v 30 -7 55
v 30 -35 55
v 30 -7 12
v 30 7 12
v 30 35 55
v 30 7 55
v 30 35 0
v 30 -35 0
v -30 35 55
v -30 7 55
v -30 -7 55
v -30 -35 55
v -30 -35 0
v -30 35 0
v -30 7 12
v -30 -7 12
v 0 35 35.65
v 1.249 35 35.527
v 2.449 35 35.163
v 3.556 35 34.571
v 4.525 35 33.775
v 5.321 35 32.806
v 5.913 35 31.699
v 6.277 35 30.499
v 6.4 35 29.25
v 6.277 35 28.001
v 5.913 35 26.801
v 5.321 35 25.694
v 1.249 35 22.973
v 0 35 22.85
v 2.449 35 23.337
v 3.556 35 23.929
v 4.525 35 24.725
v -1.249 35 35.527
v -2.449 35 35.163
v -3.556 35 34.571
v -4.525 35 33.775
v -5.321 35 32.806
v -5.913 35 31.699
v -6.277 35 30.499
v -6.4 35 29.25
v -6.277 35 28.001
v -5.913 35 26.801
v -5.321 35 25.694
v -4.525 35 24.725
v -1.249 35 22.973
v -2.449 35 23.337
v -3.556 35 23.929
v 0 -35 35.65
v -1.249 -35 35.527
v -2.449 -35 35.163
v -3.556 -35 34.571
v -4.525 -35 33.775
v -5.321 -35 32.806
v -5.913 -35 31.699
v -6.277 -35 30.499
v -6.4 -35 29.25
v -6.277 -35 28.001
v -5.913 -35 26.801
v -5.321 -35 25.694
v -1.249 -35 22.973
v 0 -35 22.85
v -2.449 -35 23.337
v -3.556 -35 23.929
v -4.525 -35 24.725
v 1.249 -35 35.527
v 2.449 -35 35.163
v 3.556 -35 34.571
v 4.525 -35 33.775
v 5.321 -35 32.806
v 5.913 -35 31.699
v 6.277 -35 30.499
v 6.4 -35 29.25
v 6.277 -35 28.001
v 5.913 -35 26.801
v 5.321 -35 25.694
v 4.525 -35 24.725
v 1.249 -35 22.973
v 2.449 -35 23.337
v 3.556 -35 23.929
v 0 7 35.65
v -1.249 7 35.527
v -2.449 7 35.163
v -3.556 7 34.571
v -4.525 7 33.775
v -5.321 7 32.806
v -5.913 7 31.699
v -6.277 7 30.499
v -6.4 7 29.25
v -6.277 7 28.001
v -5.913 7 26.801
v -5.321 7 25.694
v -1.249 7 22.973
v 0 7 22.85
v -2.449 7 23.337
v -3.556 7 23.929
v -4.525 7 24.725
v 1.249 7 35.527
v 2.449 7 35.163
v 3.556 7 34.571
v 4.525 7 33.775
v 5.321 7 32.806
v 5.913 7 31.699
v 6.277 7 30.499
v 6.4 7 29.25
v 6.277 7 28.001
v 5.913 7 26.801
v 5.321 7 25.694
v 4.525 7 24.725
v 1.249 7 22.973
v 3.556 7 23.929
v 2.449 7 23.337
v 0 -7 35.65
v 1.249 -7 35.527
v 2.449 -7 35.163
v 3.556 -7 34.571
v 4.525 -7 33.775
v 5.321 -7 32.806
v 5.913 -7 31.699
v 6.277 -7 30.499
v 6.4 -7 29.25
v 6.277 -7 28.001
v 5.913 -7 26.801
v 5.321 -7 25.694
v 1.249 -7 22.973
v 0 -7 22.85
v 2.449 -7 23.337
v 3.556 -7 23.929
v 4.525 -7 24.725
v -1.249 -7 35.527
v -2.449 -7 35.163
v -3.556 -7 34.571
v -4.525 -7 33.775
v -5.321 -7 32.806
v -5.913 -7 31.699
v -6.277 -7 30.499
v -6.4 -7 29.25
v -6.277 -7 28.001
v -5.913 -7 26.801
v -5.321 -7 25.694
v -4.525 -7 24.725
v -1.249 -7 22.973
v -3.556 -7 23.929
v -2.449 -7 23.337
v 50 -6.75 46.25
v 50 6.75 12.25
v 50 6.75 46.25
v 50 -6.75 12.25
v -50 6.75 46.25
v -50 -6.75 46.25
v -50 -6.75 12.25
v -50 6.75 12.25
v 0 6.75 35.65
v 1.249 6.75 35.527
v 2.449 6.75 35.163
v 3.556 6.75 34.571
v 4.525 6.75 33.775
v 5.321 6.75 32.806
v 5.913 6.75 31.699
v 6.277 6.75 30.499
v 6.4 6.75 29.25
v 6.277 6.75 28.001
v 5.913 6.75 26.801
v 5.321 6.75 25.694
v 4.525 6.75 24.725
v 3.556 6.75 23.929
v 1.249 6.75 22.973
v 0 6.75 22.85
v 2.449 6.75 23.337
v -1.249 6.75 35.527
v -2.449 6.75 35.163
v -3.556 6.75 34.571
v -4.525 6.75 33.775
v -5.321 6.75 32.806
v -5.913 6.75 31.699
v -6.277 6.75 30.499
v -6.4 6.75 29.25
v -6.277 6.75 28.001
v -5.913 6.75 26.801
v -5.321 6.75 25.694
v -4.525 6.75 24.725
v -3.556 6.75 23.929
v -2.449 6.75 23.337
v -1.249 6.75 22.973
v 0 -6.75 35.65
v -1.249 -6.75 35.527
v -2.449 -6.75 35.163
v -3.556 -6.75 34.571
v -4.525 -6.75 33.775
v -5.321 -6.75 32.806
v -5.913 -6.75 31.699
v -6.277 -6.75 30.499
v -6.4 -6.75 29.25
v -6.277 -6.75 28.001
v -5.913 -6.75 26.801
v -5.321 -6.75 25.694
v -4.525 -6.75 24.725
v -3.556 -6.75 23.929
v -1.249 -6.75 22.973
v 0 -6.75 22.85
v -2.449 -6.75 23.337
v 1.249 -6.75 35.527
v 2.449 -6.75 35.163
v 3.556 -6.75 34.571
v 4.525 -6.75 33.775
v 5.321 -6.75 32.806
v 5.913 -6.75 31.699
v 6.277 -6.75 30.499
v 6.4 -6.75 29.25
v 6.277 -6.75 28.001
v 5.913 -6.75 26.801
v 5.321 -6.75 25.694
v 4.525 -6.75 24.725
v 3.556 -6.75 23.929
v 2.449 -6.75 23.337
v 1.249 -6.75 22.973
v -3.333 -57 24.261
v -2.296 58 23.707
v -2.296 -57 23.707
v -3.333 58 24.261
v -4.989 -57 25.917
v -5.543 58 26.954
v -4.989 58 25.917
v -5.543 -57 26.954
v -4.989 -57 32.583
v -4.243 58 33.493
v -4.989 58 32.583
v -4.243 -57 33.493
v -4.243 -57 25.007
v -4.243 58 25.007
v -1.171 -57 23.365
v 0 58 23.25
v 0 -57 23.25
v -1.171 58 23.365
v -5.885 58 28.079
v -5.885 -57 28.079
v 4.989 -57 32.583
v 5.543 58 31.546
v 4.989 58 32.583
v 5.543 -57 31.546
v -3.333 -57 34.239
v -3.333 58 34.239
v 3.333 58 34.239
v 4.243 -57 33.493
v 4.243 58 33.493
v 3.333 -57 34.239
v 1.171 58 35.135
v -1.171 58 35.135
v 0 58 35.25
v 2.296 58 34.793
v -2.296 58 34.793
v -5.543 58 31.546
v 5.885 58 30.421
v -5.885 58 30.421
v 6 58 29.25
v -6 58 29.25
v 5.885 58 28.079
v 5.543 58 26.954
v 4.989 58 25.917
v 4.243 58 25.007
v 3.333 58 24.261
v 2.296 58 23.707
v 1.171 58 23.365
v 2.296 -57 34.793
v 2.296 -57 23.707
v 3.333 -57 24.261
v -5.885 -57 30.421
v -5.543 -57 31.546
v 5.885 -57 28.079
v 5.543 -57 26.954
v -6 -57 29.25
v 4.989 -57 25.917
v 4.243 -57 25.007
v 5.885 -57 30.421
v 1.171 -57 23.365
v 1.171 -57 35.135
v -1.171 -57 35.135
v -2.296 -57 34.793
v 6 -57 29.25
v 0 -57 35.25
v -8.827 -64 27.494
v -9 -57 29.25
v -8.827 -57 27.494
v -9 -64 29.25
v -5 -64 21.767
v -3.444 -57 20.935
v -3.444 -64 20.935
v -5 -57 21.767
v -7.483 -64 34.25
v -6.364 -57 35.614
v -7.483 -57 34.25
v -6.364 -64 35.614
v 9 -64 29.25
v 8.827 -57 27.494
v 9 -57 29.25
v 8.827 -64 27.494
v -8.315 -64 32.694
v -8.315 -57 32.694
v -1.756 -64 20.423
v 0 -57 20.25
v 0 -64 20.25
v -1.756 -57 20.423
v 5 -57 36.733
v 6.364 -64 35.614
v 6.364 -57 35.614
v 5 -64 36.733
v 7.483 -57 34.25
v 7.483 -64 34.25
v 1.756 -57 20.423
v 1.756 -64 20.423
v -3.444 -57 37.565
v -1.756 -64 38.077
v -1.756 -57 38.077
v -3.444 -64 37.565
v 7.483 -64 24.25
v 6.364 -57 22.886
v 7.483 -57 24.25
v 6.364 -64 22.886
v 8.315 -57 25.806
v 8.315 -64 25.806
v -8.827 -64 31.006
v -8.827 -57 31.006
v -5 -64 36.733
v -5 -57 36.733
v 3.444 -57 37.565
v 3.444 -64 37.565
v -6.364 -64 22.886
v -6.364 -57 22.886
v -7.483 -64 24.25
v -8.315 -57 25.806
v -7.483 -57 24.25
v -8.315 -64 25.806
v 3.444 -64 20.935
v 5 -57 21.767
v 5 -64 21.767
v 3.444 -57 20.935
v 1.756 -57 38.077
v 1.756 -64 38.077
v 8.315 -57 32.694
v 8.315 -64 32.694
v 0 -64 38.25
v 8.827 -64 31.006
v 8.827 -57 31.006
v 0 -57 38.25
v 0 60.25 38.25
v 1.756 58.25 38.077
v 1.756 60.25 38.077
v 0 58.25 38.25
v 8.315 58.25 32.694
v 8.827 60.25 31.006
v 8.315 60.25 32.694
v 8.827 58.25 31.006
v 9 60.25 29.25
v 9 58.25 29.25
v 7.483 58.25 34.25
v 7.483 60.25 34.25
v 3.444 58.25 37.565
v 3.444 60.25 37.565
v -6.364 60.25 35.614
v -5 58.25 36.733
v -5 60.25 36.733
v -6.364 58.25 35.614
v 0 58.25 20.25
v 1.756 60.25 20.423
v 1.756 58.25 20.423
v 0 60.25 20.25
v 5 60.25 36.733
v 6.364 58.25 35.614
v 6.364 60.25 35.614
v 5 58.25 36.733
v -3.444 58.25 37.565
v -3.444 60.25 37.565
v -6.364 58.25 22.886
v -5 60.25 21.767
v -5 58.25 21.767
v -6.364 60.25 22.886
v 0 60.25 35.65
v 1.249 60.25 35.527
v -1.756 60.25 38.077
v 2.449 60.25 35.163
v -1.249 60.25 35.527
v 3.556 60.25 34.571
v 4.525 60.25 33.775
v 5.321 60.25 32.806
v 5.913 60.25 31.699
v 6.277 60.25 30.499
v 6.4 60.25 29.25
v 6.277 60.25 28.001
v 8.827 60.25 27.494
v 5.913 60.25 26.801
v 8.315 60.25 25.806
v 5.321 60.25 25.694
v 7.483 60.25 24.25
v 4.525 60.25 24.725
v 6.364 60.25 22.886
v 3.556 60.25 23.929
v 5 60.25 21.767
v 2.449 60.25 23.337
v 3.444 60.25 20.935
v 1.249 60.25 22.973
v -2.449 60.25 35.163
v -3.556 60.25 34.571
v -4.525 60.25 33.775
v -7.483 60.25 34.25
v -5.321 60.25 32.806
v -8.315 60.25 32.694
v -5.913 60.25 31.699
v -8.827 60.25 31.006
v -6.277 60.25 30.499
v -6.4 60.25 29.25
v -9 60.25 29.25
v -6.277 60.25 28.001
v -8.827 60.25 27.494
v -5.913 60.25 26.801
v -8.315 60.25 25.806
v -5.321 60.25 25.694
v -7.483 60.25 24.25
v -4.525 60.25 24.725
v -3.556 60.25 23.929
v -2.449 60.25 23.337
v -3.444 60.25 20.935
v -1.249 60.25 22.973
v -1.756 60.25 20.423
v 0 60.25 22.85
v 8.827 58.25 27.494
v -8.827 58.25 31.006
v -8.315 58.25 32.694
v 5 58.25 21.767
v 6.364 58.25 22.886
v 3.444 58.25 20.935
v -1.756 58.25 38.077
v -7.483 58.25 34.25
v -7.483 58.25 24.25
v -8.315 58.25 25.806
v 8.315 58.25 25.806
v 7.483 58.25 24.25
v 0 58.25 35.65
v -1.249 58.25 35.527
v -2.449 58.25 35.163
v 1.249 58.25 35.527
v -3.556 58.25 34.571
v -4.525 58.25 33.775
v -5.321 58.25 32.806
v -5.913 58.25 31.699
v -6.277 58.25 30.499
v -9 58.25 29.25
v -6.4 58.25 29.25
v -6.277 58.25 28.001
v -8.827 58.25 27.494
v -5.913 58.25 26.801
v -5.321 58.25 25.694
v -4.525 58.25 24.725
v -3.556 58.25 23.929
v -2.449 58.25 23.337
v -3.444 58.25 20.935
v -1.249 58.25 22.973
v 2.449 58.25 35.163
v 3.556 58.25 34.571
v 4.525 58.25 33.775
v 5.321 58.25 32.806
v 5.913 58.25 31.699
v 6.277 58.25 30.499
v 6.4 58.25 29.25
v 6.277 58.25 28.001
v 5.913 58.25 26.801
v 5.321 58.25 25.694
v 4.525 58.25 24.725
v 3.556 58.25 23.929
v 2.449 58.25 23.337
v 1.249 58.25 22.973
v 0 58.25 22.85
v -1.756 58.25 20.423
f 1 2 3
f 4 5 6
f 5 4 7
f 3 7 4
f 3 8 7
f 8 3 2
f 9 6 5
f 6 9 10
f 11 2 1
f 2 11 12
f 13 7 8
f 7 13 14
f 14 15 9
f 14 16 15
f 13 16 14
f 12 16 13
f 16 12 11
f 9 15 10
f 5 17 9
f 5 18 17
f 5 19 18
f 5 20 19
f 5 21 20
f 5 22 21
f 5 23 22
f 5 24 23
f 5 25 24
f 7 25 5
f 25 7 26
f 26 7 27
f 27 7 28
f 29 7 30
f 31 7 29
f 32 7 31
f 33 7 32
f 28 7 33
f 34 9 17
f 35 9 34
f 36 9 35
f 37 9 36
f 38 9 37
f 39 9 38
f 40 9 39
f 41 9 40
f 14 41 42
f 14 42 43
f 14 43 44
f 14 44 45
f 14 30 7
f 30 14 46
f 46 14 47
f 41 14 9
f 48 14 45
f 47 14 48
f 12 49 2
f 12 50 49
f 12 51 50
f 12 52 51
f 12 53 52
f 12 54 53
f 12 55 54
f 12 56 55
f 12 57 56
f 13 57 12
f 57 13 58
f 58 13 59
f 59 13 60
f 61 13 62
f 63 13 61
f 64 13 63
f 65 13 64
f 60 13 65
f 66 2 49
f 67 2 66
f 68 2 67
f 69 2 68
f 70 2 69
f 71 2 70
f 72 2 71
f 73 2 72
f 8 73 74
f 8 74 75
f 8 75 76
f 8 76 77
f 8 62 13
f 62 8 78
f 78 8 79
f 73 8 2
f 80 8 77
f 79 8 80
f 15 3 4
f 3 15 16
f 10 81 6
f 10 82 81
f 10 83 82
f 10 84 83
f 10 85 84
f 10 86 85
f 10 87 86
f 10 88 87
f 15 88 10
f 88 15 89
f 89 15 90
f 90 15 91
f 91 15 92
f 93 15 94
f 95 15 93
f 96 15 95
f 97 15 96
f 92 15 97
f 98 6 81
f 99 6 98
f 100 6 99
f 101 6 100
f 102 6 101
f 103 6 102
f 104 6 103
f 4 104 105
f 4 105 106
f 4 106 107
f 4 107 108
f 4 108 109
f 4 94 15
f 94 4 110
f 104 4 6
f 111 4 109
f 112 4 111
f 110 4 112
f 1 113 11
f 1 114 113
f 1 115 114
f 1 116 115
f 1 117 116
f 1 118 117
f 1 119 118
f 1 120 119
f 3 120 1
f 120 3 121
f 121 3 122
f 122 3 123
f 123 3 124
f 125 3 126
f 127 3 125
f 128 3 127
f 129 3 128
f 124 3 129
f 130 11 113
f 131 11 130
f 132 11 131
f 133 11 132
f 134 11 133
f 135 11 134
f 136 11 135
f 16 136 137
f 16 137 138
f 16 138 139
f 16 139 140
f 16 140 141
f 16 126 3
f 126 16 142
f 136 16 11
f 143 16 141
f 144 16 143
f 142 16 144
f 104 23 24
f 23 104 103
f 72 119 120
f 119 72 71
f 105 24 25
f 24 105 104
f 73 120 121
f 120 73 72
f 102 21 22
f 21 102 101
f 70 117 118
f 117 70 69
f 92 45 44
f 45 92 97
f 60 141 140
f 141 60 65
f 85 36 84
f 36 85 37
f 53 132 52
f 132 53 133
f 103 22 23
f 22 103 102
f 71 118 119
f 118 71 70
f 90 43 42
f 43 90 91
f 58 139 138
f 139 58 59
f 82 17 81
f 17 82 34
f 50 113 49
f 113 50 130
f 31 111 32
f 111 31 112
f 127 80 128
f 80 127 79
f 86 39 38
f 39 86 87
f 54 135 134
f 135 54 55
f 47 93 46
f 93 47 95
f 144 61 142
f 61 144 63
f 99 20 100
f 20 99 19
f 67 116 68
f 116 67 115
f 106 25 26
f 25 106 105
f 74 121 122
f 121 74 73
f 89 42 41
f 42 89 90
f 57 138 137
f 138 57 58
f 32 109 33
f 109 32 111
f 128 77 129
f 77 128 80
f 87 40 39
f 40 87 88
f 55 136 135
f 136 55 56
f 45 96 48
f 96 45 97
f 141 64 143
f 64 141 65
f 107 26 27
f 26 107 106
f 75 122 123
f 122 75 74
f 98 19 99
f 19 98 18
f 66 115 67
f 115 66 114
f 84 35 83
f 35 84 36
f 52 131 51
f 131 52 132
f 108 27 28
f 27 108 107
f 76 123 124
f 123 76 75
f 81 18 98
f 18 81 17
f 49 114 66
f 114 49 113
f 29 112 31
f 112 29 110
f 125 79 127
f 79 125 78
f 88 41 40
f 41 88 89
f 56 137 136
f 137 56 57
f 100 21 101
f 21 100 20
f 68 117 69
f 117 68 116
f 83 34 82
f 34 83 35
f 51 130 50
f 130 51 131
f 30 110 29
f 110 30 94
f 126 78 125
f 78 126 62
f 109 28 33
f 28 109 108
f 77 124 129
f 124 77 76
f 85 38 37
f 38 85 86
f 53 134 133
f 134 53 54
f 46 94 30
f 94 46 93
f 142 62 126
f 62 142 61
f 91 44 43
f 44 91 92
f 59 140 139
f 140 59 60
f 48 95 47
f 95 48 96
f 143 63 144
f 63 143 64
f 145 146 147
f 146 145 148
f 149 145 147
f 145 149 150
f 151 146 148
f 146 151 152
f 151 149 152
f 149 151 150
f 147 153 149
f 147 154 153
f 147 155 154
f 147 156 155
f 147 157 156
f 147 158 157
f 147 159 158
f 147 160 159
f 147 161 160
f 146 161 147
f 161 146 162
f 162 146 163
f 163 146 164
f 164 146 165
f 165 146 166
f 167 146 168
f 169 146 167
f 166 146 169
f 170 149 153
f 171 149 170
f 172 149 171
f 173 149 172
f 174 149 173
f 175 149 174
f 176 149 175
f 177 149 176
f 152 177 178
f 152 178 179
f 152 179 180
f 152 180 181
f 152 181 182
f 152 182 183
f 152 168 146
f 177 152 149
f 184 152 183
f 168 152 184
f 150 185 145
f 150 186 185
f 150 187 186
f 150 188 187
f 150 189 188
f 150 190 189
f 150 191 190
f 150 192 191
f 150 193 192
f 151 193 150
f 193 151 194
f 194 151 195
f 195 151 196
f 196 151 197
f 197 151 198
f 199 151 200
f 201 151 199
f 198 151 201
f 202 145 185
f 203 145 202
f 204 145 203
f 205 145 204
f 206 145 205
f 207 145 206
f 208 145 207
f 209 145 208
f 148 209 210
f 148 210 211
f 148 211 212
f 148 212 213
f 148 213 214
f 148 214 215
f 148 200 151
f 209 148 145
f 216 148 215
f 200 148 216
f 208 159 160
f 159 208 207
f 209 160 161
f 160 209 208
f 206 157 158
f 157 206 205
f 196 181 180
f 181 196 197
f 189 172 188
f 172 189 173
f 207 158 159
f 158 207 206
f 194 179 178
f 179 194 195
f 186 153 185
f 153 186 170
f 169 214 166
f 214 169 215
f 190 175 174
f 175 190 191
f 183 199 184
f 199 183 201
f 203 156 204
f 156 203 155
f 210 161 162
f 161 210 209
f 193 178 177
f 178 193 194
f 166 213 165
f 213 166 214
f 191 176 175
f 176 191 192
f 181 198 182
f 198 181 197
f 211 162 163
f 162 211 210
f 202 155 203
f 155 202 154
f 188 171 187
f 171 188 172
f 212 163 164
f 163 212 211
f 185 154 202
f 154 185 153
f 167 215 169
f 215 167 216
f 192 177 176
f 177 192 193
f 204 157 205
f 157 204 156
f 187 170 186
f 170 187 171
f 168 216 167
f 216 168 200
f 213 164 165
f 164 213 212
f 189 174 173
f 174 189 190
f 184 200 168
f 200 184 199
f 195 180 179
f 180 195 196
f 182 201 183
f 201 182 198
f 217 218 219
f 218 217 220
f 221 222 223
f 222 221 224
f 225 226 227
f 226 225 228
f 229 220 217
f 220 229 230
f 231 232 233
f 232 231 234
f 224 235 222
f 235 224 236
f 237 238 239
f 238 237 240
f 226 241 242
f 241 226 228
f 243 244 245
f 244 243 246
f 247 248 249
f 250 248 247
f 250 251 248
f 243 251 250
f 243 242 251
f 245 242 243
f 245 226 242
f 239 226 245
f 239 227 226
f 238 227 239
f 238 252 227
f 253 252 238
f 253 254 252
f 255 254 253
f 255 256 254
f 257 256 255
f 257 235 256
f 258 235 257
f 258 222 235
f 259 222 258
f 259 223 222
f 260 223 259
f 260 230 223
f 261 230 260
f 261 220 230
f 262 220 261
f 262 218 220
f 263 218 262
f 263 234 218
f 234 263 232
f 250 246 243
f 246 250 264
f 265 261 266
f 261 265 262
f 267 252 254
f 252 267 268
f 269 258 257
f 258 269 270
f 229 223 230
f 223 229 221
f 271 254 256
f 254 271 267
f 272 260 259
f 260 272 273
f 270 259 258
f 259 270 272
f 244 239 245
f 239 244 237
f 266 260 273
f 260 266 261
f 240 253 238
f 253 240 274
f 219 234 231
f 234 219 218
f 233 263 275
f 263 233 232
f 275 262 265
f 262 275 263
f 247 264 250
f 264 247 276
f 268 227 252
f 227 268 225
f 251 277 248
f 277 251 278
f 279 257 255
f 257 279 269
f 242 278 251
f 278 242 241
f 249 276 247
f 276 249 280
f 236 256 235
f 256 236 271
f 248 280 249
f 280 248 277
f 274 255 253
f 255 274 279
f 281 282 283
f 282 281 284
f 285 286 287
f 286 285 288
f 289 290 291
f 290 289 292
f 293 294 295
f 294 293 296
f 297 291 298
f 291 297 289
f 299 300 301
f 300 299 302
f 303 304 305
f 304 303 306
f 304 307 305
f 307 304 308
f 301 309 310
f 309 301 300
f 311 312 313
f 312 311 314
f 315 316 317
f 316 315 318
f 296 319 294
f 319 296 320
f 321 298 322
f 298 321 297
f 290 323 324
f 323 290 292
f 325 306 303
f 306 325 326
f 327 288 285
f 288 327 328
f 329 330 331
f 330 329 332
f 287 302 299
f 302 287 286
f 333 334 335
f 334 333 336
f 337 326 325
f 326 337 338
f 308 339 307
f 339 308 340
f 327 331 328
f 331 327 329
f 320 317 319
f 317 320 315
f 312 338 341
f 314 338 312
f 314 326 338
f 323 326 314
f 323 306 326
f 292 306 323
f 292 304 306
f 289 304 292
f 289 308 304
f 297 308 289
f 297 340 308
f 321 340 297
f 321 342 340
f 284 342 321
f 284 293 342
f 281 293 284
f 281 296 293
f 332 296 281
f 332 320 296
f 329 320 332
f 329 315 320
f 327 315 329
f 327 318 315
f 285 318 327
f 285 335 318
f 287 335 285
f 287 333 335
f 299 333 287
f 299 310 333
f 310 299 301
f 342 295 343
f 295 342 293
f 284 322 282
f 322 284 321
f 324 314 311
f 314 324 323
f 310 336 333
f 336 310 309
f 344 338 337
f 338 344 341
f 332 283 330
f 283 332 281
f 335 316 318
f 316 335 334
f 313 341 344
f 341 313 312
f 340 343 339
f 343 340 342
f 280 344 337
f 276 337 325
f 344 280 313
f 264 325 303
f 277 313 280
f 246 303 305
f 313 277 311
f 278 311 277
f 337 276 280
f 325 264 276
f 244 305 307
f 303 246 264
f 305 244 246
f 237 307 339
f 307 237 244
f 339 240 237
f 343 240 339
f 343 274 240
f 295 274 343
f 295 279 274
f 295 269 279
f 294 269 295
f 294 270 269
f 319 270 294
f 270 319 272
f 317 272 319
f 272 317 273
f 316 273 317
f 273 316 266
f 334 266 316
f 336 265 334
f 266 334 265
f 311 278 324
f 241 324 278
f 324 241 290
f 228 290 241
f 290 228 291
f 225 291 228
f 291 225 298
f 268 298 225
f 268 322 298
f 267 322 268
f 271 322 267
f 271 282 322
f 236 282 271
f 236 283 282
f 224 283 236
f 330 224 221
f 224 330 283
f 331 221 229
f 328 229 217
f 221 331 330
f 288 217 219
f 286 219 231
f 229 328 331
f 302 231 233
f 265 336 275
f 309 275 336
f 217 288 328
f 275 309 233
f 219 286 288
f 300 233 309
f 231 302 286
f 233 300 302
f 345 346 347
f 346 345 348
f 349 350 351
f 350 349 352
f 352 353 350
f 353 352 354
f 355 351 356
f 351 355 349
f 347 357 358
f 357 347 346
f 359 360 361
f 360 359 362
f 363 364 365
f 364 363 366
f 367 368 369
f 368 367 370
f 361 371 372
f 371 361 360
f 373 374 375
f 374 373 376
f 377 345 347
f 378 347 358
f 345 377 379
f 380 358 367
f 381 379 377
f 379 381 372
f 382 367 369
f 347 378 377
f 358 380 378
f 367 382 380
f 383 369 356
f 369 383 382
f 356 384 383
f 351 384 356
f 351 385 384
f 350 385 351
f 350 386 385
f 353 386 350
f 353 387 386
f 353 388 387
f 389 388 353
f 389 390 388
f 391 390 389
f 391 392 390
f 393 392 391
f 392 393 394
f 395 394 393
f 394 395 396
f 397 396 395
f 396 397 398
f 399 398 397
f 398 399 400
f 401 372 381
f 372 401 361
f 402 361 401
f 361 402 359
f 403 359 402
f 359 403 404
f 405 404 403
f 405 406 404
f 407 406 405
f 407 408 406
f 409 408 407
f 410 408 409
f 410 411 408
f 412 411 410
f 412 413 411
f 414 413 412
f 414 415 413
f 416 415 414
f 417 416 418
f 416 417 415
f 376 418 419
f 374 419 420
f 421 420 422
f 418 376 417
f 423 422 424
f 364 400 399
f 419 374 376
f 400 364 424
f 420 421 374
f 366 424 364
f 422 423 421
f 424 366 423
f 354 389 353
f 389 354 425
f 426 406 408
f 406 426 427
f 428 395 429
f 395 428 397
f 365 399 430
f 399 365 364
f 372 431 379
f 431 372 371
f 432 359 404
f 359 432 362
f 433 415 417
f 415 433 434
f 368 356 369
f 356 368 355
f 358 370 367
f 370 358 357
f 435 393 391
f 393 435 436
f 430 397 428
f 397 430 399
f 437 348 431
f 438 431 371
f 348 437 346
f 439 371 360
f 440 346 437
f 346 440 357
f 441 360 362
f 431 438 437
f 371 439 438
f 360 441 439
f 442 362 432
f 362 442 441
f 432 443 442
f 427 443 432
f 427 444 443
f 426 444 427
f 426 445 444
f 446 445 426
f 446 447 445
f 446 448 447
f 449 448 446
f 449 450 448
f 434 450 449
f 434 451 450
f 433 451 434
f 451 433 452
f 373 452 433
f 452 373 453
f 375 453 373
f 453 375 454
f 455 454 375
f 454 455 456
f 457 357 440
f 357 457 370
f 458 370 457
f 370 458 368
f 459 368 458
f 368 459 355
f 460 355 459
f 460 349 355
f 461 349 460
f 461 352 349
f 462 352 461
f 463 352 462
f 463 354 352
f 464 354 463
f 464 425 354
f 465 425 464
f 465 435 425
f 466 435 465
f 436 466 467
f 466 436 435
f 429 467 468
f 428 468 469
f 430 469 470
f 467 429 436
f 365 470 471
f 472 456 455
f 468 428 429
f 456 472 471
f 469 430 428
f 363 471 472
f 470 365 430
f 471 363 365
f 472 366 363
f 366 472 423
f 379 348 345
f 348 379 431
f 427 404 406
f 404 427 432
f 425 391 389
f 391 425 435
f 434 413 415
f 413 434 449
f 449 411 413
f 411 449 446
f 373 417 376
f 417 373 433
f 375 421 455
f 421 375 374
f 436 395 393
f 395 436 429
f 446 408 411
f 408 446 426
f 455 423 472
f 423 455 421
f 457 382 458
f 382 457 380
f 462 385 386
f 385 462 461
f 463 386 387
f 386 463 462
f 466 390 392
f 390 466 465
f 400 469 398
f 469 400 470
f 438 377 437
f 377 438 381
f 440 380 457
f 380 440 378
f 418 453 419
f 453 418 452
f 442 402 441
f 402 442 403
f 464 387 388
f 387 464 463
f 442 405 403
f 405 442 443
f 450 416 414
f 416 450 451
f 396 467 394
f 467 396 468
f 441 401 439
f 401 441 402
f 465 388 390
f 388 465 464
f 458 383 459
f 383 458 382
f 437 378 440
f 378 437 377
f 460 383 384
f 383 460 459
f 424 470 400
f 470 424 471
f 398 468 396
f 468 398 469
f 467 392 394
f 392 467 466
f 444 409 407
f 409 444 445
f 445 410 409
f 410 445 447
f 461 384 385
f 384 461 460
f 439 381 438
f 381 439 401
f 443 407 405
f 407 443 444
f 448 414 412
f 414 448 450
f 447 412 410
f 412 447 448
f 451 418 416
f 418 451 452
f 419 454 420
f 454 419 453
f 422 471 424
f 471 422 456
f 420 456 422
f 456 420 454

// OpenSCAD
$fn = 32;

// ------------------------------------------------------------------------
// Clevis joint: 60 mm clevis, pin d12
// Every part is its own module, assembly() places them once.
// ------------------------------------------------------------------------

// --- part 1 ---
module clevis() {
  difference() {
    translate([-30, -35, 0]) cube([60, 70, 55]);
    translate([-31, -7, 12]) cube([62, 14, 44]);
    translate([0, 0, 29.25]) rotate([90, 0, 0]) cylinder(h = 72, d = 12.8, center = true);
  }
}

// --- part 2 ---
module eye() {
  difference() {
    translate([-50, -6.75, 0]) cube([100, 13.5, 34]);
    translate([0, 0, 17]) rotate([90, 0, 0]) cylinder(h = 15.5, d = 12.8, center = true);
  }
}

// --- part 3 ---
module pin() {
  rotate([0, 90, 0]) cylinder(h = 116, d = 12, center = true);
  translate([-64, 0, 0]) rotate([0, 90, 0]) cylinder(h = 7, d = 18);
}

// --- part 4 ---
module retainer() {
  difference() {
      translate([0, 0, 0]) cylinder(h = 2, d = 18);
      translate([0, 0, -1]) cylinder(h = 4, d = 12.8);
    }
}

// --- assembly ---
module assembly() {
  translate([0, 0, 0]) rotate([0, 0, 0]) clevis();
  translate([0, 0, 12.25]) rotate([0, 0, 0]) eye();
  translate([0, 0, 29.25]) rotate([0, 0, 90]) pin();
  translate([0, 60.25, 29.25]) rotate([90, 0, 0]) retainer();
}

assembly();
